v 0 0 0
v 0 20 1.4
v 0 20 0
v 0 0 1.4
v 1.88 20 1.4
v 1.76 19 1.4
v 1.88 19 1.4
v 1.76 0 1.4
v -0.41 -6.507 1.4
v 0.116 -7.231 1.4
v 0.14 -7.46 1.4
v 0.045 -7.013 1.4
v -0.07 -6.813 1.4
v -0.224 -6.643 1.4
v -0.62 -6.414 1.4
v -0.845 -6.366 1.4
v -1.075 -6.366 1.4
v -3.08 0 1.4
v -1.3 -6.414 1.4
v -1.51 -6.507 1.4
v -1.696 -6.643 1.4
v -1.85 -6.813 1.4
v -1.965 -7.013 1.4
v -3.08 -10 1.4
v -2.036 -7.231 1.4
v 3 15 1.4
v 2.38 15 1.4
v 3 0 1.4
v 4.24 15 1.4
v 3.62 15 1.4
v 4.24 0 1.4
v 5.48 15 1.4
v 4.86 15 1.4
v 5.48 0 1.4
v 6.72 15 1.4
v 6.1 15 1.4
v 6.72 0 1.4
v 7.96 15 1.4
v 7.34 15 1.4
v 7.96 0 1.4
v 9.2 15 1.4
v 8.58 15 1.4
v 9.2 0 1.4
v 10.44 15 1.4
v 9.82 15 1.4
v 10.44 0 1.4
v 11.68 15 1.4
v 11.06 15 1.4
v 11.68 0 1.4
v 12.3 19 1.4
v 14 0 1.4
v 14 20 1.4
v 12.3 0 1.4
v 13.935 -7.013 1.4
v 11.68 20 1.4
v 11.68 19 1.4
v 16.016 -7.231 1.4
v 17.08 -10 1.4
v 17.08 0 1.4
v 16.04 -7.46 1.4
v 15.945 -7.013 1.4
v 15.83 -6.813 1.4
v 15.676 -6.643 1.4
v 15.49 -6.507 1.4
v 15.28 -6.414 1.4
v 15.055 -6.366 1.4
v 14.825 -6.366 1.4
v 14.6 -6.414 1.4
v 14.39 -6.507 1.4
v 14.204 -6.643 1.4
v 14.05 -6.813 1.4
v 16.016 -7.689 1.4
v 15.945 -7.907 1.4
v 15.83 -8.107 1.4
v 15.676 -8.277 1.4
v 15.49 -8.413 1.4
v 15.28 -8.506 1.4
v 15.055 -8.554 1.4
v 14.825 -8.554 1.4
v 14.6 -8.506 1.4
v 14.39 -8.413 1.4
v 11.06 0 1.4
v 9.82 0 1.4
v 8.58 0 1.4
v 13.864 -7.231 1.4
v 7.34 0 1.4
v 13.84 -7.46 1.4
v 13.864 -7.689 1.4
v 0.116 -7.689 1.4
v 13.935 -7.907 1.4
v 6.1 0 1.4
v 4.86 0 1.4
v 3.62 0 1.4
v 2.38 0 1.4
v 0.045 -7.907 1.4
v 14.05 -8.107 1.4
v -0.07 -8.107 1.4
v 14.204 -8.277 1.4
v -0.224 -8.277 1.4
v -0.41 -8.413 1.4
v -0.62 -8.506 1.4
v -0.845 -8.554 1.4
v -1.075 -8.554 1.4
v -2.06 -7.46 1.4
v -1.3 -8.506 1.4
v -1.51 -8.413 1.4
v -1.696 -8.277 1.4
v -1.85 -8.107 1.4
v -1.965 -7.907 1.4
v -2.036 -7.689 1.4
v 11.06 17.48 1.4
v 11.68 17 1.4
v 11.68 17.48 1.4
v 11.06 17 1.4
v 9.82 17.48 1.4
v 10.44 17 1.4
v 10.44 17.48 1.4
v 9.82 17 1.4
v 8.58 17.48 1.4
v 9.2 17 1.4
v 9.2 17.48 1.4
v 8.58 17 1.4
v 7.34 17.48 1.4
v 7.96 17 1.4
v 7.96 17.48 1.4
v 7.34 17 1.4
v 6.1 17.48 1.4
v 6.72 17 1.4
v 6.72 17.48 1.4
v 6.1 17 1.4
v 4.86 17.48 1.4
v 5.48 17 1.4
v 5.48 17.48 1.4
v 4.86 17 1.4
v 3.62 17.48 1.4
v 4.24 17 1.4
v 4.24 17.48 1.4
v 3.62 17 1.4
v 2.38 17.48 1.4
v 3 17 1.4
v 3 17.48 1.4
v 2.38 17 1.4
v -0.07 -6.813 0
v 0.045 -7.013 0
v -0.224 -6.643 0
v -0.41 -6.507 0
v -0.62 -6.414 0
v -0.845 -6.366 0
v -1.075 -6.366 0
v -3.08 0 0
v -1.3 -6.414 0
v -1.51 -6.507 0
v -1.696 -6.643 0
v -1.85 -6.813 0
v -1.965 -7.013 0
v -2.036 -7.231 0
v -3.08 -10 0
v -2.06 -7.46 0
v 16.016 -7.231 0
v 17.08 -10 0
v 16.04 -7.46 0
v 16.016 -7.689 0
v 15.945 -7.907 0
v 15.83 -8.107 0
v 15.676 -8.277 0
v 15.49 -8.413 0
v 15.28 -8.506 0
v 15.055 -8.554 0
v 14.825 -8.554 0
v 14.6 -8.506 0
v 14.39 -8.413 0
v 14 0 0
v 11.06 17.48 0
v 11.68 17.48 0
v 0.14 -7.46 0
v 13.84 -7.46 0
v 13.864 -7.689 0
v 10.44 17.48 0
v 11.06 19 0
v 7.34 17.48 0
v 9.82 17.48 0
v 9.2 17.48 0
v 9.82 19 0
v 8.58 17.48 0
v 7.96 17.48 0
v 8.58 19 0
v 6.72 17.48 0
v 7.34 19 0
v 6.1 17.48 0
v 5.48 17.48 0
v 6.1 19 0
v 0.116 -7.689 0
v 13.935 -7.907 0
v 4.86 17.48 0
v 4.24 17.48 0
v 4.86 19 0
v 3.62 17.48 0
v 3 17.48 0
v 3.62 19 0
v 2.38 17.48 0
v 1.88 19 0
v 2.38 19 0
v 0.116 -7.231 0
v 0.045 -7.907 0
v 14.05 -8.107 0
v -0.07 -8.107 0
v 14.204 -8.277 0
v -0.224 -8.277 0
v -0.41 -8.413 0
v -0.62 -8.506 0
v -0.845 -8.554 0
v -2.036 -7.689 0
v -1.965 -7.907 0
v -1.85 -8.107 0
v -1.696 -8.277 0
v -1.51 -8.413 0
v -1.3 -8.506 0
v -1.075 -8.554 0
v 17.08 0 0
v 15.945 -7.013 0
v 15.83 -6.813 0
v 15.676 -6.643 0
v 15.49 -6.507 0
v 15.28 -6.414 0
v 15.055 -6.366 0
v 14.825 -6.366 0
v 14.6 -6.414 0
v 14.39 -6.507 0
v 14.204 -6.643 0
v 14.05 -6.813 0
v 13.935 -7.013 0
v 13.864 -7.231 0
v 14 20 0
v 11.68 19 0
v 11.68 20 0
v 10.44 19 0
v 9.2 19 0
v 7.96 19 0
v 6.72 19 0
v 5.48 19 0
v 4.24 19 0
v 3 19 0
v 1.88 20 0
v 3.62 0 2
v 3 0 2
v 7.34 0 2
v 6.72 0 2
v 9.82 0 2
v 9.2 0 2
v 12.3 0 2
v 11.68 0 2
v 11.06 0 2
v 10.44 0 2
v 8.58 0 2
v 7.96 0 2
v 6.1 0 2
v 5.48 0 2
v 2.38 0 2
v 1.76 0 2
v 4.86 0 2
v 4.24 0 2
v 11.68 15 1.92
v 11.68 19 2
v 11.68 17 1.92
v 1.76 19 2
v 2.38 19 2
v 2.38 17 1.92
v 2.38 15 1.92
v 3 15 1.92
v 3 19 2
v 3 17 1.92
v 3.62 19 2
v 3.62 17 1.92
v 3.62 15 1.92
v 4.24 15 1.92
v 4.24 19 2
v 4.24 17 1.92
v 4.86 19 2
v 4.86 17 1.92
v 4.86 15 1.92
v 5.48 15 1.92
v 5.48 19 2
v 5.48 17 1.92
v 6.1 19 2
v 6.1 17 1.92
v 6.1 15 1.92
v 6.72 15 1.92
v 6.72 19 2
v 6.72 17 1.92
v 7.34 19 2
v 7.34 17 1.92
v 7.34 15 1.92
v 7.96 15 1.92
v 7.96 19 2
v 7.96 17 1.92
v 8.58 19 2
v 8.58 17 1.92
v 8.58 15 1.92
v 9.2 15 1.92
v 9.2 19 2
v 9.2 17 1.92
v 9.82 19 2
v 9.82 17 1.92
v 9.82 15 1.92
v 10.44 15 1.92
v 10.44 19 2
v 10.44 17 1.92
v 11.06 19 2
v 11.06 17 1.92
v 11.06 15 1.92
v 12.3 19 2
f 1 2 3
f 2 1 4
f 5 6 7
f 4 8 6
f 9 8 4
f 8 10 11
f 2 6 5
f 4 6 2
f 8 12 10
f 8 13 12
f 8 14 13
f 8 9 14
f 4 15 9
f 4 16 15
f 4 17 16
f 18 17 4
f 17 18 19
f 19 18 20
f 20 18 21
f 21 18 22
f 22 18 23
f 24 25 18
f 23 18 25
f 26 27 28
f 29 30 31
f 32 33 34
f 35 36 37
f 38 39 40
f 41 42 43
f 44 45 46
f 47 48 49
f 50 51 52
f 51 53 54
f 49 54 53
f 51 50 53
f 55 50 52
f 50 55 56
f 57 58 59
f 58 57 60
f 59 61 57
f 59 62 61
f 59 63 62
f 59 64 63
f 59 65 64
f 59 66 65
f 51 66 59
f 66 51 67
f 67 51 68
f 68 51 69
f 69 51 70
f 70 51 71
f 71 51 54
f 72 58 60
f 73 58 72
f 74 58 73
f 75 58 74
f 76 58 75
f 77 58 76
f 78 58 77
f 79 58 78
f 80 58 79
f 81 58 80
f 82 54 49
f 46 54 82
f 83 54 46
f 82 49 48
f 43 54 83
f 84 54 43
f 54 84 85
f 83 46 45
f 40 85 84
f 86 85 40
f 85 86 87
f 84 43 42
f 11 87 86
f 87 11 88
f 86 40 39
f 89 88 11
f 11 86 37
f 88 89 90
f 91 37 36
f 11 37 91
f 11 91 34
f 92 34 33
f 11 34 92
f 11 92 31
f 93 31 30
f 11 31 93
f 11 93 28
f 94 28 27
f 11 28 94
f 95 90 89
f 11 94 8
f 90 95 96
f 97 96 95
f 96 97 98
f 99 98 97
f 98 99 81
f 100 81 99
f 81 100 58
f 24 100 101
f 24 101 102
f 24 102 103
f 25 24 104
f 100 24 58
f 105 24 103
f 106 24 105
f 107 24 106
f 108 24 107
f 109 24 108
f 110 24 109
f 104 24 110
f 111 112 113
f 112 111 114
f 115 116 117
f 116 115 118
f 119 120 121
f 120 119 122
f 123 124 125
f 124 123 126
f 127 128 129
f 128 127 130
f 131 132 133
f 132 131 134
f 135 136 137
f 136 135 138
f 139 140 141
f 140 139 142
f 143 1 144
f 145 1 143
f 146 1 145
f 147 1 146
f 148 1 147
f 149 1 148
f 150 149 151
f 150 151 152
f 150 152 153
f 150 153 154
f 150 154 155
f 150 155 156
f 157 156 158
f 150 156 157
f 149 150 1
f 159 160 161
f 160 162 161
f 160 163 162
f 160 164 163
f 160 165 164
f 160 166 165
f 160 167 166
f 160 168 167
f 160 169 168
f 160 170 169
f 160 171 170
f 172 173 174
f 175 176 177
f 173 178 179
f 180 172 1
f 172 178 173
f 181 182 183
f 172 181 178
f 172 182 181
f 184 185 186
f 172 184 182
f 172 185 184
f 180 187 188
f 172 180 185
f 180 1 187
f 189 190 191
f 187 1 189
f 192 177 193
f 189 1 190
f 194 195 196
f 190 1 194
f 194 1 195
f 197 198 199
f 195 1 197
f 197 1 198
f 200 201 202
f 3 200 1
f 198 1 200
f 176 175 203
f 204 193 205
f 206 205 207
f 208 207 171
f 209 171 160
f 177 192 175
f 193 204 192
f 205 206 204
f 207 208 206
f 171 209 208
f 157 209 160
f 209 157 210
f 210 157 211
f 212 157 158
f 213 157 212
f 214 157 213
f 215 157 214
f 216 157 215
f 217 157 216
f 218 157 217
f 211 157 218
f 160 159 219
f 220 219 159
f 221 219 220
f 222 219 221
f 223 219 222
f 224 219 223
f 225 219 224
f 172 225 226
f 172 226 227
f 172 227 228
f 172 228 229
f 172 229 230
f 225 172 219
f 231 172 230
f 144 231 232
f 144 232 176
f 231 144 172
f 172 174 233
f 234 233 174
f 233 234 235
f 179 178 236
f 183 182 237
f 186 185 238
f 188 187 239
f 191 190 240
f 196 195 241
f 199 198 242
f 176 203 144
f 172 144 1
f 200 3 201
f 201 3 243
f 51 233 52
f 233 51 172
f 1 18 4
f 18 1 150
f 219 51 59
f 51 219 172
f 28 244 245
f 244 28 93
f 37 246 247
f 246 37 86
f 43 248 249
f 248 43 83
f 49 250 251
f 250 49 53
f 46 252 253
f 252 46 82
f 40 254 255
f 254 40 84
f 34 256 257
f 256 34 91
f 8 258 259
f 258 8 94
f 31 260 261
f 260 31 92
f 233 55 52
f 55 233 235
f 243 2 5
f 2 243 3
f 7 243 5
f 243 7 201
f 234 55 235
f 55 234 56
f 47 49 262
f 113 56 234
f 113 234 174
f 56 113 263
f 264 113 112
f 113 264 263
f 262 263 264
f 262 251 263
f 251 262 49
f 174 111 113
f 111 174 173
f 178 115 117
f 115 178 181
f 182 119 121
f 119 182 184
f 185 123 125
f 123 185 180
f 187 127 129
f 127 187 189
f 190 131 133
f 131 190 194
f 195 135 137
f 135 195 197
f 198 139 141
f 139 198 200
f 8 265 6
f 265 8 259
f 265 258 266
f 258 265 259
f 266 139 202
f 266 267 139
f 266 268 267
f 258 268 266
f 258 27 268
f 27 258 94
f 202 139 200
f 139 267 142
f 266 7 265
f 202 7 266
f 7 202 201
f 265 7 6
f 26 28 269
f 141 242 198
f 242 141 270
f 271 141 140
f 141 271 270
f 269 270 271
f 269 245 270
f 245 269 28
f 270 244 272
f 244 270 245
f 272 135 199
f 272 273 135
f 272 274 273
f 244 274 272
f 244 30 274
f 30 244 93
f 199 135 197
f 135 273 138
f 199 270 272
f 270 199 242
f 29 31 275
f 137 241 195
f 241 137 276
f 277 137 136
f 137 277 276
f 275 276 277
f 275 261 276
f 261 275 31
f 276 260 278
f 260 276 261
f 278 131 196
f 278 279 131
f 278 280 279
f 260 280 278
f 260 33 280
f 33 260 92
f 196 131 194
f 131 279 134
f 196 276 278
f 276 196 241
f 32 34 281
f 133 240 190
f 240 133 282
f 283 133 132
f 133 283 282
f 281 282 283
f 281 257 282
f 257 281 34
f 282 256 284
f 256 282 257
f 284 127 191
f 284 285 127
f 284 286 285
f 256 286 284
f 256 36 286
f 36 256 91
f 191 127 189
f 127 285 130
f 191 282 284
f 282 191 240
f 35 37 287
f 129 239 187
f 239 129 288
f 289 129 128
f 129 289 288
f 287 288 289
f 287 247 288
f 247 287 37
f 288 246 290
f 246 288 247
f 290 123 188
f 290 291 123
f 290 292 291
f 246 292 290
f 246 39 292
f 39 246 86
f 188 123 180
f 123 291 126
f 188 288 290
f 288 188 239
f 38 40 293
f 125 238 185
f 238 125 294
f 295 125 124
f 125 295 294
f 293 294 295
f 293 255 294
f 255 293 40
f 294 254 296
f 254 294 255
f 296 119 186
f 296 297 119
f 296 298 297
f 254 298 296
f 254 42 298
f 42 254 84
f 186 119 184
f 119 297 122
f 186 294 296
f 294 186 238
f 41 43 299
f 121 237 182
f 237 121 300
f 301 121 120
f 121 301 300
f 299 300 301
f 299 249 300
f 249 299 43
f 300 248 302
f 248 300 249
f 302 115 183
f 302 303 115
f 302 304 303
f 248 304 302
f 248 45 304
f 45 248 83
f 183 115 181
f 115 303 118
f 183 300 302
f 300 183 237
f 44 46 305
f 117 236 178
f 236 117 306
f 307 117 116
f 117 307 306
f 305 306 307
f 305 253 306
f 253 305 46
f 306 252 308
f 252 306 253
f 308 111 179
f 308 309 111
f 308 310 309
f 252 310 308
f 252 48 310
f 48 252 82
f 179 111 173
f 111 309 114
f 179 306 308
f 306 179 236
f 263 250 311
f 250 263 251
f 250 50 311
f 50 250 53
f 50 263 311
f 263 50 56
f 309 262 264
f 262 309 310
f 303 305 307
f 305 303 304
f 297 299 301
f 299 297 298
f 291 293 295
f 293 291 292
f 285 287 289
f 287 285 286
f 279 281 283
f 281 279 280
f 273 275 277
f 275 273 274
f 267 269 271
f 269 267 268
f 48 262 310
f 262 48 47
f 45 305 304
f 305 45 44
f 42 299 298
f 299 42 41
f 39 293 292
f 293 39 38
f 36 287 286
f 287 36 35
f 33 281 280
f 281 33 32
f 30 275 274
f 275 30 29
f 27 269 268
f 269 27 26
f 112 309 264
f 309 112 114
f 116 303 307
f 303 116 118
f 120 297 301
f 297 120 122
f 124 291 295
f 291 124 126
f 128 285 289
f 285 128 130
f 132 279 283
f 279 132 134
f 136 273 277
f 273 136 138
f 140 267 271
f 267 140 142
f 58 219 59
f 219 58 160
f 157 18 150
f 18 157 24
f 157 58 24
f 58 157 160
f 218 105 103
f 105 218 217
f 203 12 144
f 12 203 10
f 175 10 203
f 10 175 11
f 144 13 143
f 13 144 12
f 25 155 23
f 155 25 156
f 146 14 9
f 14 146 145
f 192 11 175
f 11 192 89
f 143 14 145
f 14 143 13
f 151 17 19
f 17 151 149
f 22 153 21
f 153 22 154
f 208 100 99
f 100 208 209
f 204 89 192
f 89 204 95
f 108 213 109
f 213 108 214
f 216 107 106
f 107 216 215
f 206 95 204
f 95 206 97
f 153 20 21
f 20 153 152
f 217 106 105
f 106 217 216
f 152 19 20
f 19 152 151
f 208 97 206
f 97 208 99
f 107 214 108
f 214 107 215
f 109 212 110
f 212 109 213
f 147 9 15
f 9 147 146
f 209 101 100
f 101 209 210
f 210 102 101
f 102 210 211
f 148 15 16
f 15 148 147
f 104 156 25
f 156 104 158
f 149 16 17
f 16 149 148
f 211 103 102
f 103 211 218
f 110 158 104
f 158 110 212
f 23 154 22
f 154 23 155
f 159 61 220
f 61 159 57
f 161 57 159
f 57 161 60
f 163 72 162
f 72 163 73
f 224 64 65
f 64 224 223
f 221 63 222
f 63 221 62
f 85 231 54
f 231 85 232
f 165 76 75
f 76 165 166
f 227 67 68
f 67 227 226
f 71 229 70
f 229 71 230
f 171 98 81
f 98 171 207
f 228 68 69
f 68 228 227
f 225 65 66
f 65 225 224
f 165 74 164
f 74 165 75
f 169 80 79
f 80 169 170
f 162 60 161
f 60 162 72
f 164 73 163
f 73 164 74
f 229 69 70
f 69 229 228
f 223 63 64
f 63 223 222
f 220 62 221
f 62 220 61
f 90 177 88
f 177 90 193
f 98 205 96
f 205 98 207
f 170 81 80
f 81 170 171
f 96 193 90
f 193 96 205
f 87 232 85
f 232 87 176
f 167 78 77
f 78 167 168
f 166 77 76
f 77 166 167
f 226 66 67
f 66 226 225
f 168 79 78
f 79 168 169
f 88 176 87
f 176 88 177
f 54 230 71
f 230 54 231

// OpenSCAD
// PSX serial experimenters connector
// originally from https://github.com/hornc/psx-serial-expts
// modified by Stephen Whittle 2025

// Width of contact channels:
width = 0.62;

module ridge() {
    cube([width, 19, 2]);
}
union()
{
    // connector
    translate([14,20,0])
    {
        rotate(180)
        {
            difference() {
                cube([14, 20, 1.4]);
                translate([1.7 + width, -0.1, -0.1]) {
                    cube([15*width + .5 , width + 2, 2.5]);
                }
            }


            for ( i = [1 : 2 : 17]){
				translate([1.7 + 17*width - i * width, 1, 0]) {
				  ridge();
				}
            }


            // Top bar
            translate([1.7, 3, 1.3]) {
                 cube([17*width, 2, width]);   
            }

        }
    }
    // protoboard mounting plate
    translate([-3.08, -10, 0])
    {
        difference(){
            cube([20.16,10,1.4]);
            translate([2.12,2.54, 0])
            {
                cylinder(h=2, d=2.2, $fn=30);
            }
            translate([2.12 + 15.9,2.54, 0])
            {
                cylinder(h=2, d=2.2, $fn=30);
            }
        }
    }
}
